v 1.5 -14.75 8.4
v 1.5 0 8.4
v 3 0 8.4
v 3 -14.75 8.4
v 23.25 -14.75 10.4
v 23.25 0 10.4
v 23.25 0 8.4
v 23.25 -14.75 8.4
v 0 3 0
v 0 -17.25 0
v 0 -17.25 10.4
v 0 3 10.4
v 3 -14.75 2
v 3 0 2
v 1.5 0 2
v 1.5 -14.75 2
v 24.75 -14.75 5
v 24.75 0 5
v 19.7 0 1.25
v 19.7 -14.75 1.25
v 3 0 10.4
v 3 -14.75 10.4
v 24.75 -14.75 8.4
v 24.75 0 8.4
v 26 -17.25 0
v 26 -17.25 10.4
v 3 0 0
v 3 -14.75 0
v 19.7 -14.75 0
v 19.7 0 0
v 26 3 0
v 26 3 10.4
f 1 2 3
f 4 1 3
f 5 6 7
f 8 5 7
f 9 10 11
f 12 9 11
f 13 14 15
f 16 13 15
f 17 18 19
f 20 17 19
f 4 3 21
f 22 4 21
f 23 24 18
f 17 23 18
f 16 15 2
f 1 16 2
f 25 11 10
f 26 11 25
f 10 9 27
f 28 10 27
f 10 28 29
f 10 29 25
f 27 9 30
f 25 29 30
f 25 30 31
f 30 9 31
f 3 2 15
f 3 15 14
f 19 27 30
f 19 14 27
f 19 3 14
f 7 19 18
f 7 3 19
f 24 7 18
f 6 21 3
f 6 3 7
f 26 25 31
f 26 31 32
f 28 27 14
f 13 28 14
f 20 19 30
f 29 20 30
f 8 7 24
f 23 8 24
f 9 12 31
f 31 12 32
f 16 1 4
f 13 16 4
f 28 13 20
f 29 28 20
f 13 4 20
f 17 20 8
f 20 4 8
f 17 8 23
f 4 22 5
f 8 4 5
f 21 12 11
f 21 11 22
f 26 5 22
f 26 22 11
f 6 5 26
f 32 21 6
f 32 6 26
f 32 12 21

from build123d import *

# Parameters (mm, degrees)
F1_DEPTH = 14.75
F2_DEPTH = 3
F3_W     = 26
F3_H     = 10.4
F4_DEPTH = 2.5
F5_W     = 26
F5_H     = 10.4
F6_DEPTH = 2.5


with BuildPart() as f1:
    # F0 (on Front) → F1 (new body)
    with BuildSketch(Plane.XZ):
        Polygon((3, 10.4), (0, 10.4), (0, 0), (3, 0), (3, 2), (1.5, 2), (1.5, 8.4), (3, 8.4), align=None)
    extrude(amount=F1_DEPTH)



with BuildPart() as f1b:
    # F0 (on Front) → F1, piece 2 (new body)
    with BuildSketch(Plane.XZ):
        Polygon((26, 10.4), (23.25, 10.4), (23.25, 8.4), (24.75, 8.4), (24.75, 5), (19.7, 1.25), (19.7, 0), (26, 0), align=None)
    extrude(amount=F1_DEPTH)


with BuildPart() as f1_1:
    add(f1.part)

    add(f1b.part)  # F2 merges F1b
    # F0 (on Front) → F2 (join)
    with BuildSketch(Plane.XZ):
        Polygon((23.25, 10.4), (3, 10.4), (3, 8.4), (1.5, 8.4), (1.5, 2), (3, 2), (3, 0), (19.7, 0), (19.7, 1.25), (24.75, 5), (24.75, 8.4), (23.25, 8.4), align=None)
        Polygon((26, 10.4), (23.25, 10.4), (23.25, 8.4), (24.75, 8.4), (24.75, 5), (19.7, 1.25), (19.7, 0), (26, 0), align=None)
        Polygon((3, 10.4), (0, 10.4), (0, 0), (3, 0), (3, 2), (1.5, 2), (1.5, 8.4), (3, 8.4), align=None)
    extrude(amount=-F2_DEPTH)

    # F3 (on face) → F4 (join)
    with BuildSketch(Plane.XZ.offset(14.75)):
        with Locations((13, 5.2)):
            Rectangle(F3_W, F3_H)
    extrude(amount=F4_DEPTH)

    # F5 (on Front) → F6 (join)
    with BuildSketch(Plane.XZ):
        with Locations((13, 5.2)):
            Rectangle(F5_W, F5_H)
    extrude(amount=-F6_DEPTH)


solid = f1_1.part
